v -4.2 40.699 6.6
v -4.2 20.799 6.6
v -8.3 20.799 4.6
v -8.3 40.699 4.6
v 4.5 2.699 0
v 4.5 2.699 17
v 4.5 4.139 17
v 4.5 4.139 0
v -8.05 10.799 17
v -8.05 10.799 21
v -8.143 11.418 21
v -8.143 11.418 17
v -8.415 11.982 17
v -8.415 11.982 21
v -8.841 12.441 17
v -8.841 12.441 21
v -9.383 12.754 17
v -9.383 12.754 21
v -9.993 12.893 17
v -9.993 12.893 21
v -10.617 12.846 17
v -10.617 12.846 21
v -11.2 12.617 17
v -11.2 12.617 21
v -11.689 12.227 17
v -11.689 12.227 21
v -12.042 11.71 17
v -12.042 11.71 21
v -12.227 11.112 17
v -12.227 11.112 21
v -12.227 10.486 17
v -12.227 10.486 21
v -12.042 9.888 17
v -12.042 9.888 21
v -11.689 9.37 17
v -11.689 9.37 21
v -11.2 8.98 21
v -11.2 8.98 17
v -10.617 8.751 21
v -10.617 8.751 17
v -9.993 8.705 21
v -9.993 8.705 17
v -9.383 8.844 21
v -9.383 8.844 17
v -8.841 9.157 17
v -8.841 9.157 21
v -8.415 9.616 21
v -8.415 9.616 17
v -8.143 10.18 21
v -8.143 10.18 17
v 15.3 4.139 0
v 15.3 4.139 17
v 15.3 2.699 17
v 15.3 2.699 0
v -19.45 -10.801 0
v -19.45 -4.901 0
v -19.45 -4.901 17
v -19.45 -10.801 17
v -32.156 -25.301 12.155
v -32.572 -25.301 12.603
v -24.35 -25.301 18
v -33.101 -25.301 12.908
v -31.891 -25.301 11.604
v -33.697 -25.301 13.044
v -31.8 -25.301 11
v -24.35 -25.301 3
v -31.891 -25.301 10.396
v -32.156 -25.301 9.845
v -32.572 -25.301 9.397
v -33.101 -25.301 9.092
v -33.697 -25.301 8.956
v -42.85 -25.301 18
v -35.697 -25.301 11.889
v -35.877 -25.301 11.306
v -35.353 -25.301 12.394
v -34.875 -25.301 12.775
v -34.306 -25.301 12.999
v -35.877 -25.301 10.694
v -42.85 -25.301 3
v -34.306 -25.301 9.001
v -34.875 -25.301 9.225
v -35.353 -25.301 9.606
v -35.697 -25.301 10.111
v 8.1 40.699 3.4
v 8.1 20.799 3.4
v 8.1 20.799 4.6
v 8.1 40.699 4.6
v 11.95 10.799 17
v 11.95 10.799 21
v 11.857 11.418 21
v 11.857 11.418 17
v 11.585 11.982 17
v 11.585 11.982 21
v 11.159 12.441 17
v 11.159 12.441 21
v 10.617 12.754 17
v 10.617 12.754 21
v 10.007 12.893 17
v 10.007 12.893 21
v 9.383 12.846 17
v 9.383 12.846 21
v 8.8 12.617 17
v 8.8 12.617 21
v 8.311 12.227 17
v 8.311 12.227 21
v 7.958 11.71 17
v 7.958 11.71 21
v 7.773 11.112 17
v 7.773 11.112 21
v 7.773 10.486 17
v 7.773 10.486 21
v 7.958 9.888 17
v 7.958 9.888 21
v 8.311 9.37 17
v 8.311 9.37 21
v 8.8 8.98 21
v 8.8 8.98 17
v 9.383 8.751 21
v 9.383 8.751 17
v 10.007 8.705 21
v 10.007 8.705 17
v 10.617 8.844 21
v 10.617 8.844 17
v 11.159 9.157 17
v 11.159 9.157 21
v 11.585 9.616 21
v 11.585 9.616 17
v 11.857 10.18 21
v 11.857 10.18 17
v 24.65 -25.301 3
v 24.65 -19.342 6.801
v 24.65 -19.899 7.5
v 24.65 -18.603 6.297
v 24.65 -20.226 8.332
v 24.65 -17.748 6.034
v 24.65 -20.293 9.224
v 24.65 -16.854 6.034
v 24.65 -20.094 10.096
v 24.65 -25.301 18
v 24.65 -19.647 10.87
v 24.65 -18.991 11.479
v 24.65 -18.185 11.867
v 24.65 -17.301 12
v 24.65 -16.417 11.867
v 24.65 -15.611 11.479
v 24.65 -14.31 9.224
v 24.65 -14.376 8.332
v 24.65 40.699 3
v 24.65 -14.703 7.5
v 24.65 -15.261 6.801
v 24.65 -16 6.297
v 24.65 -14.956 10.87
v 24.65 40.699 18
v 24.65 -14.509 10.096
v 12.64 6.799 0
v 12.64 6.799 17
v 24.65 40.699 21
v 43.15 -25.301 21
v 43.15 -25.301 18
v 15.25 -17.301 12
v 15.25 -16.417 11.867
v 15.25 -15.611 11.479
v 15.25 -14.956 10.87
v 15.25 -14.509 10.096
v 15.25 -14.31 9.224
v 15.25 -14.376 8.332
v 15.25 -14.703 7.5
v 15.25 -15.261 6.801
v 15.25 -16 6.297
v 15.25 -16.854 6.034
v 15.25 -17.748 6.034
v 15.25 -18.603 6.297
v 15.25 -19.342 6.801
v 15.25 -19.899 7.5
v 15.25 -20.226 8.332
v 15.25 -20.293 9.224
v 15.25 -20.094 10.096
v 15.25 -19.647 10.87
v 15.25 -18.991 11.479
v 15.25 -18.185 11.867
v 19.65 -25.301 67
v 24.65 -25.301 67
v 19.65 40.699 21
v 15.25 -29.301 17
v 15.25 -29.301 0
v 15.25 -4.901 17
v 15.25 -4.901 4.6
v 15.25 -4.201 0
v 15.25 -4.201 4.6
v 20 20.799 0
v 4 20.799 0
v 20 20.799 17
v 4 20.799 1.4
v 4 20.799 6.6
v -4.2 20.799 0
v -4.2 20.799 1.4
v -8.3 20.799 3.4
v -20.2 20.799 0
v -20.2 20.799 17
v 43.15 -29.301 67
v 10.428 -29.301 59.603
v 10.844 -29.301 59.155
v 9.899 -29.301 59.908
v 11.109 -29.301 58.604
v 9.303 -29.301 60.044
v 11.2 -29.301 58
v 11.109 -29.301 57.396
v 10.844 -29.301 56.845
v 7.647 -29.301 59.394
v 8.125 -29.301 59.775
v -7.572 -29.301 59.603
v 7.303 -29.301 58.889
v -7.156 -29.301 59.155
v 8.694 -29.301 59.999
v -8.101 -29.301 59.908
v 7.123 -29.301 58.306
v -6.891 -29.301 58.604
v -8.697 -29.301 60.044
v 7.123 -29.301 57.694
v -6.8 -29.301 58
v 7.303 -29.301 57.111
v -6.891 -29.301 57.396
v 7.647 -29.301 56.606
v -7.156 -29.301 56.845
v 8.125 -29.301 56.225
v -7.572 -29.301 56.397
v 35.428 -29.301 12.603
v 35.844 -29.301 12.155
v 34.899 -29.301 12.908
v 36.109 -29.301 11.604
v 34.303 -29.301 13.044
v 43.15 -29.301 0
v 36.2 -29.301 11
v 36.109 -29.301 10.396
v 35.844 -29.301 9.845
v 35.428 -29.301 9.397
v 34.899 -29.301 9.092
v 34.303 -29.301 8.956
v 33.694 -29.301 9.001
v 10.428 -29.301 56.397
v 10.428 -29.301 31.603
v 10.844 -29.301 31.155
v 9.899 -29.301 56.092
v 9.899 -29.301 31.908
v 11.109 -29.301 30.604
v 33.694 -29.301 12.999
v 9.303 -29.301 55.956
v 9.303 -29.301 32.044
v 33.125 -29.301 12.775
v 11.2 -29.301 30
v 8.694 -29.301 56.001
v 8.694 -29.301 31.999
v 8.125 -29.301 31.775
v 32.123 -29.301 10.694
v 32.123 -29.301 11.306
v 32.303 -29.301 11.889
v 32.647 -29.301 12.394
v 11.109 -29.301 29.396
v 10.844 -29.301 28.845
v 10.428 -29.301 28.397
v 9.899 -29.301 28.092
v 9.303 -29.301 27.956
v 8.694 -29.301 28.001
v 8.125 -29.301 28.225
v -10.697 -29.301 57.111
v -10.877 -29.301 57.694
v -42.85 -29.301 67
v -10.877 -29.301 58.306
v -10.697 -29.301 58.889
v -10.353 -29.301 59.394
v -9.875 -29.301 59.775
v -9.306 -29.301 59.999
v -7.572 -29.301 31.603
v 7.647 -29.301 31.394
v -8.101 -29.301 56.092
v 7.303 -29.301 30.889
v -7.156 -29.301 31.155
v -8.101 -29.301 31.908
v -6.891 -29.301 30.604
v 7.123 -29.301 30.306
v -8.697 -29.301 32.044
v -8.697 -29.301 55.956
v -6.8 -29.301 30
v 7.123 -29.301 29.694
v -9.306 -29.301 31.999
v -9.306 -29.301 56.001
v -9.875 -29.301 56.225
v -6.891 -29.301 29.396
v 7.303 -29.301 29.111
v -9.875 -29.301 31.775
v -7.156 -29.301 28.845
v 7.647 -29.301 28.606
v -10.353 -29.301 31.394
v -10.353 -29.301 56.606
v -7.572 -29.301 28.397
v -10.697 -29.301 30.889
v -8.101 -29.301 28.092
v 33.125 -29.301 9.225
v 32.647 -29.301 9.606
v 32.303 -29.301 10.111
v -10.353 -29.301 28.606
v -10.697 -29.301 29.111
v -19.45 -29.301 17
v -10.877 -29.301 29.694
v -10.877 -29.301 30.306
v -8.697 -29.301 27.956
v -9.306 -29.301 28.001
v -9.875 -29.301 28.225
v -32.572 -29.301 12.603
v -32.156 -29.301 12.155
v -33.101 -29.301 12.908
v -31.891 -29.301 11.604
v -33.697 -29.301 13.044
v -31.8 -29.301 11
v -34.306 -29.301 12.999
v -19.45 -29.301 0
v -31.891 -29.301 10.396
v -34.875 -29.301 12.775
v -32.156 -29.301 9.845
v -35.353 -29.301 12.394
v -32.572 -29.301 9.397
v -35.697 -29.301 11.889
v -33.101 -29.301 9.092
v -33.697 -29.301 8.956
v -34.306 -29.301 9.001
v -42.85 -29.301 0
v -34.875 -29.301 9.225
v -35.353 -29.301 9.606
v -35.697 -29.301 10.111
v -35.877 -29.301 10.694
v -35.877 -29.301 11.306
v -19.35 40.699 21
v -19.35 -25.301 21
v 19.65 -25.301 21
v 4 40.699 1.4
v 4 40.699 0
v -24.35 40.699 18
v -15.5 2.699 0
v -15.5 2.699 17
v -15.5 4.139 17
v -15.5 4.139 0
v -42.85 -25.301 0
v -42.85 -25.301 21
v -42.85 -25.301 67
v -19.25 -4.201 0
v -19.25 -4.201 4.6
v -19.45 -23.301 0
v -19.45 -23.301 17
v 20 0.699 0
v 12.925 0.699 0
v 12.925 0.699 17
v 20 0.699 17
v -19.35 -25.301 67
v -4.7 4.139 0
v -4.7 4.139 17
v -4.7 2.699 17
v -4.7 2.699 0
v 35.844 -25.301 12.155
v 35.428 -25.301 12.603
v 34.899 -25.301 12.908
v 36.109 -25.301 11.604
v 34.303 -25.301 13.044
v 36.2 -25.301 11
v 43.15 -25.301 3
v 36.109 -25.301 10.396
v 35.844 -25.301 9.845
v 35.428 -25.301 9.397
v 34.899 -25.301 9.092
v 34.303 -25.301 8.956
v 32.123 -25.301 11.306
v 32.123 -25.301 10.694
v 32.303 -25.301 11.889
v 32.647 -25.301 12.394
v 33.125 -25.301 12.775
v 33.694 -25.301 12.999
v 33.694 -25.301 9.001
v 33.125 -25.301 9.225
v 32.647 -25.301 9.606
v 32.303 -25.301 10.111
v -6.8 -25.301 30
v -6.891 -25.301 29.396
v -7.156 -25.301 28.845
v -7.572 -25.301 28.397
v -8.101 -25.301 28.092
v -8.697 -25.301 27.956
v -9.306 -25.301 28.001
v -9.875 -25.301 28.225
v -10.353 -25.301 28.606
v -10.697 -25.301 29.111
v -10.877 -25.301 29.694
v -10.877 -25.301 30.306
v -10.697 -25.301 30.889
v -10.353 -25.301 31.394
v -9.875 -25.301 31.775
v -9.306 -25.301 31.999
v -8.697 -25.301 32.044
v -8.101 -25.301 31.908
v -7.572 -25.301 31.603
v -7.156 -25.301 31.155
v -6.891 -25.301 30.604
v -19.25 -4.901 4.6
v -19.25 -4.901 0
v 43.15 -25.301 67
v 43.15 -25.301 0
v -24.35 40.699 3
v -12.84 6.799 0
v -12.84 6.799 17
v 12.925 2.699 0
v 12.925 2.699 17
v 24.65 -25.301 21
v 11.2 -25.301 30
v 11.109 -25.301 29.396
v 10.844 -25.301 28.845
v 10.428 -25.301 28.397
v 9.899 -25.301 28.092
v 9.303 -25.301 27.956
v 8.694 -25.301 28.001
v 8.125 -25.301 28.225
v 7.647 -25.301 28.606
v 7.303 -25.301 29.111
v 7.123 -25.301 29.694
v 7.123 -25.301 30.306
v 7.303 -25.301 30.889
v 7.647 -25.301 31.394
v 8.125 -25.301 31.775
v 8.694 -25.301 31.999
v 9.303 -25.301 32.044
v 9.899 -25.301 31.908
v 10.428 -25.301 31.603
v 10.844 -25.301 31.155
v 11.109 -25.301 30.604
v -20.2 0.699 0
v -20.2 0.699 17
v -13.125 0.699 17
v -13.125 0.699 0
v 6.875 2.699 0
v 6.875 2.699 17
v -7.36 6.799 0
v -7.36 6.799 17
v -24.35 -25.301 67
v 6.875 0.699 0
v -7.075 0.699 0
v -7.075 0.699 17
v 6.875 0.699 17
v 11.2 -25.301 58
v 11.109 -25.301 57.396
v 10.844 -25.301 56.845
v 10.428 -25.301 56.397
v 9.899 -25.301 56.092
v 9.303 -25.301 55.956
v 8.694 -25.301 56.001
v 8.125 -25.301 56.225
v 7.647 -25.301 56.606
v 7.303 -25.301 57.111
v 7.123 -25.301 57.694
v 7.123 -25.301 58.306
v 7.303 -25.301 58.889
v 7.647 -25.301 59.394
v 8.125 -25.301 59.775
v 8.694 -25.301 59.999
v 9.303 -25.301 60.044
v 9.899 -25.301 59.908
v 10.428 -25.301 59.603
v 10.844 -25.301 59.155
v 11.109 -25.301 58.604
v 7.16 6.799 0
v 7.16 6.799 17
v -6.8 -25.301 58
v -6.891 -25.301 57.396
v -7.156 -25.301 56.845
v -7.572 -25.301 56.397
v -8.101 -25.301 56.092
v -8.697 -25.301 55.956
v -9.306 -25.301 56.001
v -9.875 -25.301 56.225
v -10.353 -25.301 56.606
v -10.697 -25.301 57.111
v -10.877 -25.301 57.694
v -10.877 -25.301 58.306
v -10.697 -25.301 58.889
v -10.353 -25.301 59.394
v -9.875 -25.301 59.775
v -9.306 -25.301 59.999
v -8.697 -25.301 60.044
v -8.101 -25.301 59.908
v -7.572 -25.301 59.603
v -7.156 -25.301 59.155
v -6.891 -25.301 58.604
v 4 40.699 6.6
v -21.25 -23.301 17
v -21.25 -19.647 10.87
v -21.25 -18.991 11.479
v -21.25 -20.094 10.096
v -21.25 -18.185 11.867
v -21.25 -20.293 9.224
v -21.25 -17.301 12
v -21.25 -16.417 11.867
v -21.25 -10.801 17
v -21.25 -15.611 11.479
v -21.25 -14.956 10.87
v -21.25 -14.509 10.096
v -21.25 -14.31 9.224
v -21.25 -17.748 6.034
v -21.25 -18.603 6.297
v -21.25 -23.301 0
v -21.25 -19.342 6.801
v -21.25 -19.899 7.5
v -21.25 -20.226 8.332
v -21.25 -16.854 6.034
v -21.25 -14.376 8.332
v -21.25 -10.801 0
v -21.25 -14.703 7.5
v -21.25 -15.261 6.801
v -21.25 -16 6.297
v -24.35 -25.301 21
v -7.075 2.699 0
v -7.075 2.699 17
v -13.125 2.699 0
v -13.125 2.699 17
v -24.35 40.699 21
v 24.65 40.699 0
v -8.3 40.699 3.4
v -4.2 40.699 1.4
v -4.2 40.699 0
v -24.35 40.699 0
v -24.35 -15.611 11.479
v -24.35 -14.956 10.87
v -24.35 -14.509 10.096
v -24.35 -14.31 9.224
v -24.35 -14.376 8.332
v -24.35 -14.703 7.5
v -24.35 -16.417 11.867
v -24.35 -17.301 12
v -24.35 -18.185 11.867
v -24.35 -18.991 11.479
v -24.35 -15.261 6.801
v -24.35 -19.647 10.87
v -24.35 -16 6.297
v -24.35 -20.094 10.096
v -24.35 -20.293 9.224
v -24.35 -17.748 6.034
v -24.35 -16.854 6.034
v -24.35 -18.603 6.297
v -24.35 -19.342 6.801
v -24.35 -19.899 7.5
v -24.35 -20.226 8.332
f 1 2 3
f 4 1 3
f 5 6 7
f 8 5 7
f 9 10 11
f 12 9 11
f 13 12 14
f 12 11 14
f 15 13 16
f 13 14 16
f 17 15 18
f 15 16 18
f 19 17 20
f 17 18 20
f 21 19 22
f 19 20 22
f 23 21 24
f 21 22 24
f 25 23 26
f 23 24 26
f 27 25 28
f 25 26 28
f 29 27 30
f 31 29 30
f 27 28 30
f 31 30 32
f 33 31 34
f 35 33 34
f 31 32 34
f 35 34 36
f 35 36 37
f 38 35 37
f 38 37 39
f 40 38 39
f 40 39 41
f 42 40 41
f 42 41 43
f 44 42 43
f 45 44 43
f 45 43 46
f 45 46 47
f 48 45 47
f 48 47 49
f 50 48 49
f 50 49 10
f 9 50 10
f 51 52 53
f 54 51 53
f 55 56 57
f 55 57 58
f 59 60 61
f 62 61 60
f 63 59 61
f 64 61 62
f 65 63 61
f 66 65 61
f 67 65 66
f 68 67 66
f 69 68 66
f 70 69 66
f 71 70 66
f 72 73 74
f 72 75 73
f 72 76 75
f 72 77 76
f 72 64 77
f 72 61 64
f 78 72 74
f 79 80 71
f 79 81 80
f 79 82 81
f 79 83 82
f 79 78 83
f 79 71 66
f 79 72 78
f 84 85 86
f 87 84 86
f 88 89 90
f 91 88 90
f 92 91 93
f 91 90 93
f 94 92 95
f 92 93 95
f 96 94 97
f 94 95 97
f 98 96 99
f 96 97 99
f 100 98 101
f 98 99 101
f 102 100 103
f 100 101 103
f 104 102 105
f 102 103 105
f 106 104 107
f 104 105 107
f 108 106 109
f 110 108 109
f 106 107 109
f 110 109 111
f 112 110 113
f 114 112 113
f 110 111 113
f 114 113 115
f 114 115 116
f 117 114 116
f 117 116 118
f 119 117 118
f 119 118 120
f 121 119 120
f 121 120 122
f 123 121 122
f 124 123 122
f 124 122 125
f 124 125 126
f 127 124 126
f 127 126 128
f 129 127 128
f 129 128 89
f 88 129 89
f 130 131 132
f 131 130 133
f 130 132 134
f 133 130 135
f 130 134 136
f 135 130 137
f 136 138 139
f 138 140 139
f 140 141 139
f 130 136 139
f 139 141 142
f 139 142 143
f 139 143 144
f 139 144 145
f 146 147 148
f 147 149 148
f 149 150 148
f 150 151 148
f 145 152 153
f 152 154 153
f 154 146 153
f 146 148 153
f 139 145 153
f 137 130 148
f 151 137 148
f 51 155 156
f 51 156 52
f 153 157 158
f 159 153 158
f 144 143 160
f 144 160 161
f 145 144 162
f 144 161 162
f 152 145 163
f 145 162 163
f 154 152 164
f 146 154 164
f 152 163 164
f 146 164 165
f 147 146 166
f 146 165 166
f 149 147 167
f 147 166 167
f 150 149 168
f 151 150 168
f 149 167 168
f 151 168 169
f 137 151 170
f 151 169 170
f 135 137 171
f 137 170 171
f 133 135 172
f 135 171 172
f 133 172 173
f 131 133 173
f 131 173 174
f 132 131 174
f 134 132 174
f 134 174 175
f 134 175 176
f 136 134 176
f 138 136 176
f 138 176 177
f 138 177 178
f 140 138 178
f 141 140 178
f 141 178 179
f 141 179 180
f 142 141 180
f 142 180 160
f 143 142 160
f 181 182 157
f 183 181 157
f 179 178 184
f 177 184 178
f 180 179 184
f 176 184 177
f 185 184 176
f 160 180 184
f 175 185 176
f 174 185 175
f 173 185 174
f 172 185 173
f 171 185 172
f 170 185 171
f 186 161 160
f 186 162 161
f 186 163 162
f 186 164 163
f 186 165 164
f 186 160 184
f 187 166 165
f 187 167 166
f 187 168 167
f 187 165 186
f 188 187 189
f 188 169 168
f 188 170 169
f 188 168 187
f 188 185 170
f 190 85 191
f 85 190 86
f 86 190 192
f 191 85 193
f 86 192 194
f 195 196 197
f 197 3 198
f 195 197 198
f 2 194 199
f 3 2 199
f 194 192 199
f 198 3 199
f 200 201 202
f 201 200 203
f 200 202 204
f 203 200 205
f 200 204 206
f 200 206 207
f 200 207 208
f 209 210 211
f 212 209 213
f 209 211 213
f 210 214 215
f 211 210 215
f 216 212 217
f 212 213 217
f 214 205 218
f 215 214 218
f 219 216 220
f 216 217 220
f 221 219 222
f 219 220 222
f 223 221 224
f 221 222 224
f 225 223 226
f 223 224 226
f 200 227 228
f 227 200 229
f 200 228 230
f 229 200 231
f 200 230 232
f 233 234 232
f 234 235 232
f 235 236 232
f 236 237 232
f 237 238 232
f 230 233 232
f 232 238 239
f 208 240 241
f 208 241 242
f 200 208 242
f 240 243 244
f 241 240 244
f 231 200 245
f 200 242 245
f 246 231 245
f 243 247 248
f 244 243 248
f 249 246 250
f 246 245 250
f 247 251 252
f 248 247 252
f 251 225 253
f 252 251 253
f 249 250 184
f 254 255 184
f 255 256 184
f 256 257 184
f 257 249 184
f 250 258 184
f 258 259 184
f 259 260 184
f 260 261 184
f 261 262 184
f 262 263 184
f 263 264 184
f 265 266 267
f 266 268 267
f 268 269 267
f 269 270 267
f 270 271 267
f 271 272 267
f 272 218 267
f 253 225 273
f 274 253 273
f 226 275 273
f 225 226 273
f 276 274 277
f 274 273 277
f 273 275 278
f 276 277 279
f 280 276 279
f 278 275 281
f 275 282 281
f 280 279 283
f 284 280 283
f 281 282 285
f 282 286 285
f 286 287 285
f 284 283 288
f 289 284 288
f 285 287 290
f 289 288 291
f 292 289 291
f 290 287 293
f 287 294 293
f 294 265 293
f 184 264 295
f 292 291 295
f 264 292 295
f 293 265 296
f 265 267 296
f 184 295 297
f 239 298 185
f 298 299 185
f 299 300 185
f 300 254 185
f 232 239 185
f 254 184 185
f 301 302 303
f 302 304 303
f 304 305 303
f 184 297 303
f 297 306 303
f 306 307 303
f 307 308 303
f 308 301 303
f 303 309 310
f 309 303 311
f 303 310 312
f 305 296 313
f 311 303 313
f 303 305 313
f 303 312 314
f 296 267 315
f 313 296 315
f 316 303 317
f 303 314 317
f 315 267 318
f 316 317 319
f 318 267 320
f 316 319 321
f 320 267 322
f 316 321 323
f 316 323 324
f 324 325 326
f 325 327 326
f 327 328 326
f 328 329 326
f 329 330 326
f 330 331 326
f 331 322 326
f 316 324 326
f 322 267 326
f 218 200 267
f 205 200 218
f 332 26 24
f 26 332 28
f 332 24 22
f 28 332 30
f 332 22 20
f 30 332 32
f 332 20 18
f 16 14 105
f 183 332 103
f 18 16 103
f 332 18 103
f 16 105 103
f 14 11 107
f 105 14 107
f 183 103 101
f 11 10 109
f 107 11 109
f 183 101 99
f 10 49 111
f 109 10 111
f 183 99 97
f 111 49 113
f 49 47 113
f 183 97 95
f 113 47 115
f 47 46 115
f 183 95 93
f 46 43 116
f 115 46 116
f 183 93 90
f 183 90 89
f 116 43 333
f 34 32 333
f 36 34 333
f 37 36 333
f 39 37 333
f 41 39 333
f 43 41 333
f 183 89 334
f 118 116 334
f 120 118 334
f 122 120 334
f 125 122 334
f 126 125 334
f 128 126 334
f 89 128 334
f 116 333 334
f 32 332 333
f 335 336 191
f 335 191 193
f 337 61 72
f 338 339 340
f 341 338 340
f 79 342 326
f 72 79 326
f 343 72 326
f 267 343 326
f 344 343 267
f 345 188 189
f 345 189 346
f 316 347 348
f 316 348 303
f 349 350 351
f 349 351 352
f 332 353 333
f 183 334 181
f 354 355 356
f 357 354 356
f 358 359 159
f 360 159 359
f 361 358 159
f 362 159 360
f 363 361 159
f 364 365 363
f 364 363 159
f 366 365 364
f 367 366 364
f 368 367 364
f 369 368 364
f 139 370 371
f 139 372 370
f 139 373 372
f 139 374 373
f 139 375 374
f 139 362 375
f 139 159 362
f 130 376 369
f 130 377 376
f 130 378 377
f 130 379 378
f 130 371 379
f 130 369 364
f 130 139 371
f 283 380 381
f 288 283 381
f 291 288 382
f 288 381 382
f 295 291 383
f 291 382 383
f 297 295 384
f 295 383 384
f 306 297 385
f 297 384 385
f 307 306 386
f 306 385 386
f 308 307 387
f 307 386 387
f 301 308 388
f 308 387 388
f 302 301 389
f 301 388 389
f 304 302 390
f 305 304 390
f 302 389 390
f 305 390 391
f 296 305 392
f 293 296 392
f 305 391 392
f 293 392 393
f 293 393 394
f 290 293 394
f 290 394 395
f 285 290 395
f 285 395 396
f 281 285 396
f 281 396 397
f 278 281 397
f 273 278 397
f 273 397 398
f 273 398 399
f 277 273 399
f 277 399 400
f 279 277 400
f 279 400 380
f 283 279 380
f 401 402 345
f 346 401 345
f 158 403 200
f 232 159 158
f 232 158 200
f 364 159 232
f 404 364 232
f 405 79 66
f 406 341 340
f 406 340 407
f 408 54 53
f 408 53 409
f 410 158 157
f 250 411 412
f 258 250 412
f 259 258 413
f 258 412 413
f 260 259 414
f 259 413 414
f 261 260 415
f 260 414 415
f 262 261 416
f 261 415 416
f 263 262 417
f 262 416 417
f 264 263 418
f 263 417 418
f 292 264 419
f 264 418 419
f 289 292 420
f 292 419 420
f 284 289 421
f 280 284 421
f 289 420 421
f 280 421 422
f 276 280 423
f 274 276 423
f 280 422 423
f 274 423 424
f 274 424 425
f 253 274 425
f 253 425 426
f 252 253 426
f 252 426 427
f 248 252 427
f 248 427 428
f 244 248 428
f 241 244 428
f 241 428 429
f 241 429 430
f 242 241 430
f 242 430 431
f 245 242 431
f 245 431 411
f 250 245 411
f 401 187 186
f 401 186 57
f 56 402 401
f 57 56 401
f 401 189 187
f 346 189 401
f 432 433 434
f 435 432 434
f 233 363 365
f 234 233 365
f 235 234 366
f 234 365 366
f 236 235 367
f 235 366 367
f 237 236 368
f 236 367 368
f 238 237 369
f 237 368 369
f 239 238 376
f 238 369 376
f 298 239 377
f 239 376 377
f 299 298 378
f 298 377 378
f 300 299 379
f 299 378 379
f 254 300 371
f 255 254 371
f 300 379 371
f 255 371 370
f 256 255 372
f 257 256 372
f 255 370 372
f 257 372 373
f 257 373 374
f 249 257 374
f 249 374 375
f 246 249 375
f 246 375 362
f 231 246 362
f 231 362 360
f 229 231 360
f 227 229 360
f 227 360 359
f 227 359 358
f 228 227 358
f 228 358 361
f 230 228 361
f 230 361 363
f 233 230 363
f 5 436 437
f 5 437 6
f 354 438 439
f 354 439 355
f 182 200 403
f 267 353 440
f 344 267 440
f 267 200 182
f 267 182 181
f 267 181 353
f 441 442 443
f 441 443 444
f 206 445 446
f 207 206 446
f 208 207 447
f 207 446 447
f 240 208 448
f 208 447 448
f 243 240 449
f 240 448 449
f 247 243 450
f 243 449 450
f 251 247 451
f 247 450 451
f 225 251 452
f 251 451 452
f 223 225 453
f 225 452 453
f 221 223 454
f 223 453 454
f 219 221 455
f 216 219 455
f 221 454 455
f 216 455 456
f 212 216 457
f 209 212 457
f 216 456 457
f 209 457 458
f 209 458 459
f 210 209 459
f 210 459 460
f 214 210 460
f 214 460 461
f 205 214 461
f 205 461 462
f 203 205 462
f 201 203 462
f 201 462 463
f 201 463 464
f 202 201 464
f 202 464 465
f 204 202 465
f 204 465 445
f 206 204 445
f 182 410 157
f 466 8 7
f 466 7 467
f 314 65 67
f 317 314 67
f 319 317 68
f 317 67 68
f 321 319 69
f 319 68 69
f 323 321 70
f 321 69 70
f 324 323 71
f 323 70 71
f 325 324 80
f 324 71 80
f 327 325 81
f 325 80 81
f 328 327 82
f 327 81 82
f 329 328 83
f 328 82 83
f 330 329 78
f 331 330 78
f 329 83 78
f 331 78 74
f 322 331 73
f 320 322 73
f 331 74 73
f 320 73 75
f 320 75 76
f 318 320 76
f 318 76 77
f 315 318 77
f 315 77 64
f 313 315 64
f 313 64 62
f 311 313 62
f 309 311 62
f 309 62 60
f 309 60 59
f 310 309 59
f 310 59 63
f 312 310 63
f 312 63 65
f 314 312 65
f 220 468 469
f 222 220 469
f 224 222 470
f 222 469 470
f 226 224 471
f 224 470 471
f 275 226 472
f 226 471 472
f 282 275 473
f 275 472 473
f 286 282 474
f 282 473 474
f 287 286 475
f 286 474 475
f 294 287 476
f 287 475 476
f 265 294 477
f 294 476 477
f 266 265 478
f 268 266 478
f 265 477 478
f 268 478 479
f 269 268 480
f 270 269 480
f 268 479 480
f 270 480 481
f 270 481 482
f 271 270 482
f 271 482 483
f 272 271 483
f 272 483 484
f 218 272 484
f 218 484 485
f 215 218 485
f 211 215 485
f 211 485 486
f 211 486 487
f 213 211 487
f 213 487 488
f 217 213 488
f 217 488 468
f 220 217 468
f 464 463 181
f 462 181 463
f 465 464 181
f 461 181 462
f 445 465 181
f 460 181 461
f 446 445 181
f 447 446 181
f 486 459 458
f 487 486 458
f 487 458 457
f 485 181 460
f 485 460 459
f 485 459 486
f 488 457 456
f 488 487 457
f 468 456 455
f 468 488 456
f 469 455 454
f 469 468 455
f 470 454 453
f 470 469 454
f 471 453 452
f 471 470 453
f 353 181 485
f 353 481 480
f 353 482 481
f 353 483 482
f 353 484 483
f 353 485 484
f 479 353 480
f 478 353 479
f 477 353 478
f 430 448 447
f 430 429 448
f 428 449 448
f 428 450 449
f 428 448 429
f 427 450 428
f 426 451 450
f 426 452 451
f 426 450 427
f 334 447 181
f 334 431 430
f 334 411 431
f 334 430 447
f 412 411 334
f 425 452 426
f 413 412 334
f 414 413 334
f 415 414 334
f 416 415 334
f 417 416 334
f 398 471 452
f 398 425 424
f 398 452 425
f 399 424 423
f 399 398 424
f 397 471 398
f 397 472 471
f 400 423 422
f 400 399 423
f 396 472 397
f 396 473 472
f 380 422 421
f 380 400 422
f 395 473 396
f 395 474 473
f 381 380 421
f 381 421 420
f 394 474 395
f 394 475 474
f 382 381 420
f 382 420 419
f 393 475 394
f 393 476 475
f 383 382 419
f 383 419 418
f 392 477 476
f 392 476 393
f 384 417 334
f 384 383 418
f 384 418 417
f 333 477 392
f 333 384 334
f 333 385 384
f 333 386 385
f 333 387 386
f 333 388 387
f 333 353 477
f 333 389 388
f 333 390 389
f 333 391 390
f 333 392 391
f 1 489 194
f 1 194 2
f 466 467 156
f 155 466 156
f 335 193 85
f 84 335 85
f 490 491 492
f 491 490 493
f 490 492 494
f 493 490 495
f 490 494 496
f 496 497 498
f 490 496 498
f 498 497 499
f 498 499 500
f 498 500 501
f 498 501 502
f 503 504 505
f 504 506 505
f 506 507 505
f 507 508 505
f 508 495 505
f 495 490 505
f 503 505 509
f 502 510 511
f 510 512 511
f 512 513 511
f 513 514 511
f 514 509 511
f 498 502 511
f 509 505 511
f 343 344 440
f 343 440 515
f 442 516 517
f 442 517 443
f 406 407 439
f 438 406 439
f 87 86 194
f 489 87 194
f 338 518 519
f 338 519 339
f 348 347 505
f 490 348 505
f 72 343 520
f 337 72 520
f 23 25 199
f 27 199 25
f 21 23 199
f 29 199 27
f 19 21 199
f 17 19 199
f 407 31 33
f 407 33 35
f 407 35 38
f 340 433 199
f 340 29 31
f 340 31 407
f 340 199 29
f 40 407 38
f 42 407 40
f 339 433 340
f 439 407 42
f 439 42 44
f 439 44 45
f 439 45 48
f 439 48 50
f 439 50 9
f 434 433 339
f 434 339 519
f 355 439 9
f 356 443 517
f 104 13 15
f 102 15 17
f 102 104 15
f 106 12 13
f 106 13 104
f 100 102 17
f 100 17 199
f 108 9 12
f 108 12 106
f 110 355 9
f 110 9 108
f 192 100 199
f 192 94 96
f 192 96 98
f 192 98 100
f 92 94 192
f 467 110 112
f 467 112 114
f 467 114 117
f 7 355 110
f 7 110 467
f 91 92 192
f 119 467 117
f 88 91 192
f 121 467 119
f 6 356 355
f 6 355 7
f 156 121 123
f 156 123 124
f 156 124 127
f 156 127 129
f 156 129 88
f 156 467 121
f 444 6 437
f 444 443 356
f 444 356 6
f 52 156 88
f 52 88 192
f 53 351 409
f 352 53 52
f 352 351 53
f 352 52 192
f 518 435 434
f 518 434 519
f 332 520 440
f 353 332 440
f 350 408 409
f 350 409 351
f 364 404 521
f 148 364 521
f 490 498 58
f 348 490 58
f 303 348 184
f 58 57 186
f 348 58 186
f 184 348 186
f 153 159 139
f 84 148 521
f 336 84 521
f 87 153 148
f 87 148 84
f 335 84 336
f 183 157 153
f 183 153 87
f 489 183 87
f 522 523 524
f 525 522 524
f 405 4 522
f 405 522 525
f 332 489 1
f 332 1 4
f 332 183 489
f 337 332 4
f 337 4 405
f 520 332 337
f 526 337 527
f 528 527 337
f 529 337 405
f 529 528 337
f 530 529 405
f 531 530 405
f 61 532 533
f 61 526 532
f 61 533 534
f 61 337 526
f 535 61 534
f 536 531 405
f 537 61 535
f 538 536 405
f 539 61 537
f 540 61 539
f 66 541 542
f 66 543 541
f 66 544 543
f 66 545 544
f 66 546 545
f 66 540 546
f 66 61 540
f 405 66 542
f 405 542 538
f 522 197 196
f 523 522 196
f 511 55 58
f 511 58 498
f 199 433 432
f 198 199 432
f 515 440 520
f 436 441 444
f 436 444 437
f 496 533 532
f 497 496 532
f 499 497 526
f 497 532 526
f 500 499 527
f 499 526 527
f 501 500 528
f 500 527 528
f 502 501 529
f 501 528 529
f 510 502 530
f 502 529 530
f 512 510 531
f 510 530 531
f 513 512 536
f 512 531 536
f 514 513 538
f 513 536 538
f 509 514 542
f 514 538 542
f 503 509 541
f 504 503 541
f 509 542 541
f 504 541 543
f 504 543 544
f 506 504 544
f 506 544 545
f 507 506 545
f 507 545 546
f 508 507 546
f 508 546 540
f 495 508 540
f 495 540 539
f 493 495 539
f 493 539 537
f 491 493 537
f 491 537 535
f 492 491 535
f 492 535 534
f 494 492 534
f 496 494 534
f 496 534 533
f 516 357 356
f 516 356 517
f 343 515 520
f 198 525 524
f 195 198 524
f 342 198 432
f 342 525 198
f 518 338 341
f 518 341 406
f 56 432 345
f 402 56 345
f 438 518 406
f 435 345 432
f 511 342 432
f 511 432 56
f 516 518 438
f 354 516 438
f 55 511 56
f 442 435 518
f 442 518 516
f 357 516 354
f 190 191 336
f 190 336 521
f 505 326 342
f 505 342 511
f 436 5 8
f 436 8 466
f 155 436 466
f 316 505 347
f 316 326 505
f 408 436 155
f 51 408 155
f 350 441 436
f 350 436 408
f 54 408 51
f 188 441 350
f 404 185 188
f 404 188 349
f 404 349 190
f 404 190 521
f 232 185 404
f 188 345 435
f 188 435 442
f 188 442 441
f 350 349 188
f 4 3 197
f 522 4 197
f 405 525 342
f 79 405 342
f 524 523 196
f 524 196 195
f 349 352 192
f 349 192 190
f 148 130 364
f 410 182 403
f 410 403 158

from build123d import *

# Parameters (mm, degrees)
EXTRUDE_1_DEPTH     = 17
SKETCH_5_R          = 3
CUT_EXTRUDE_3_DEPTH = 49
SKETCH_6_W          = 49
SKETCH_6_H          = 4
EXTRUDE_3_DEPTH     = 50
SKETCH_7_W          = 67
SKETCH_7_H          = 4
EXTRUDE_4_DEPTH     = 18.5
SKETCH_8_W          = 67
SKETCH_8_H          = 4
EXTRUDE_5_DEPTH     = 18.5
SKETCH_14_W         = 49
SKETCH_14_H         = 4
EXTRUDE_13_DEPTH    = 66
SKETCH_23_W         = 49
SKETCH_23_H         = 19.9
EXTRUDE_18_DEPTH    = 17
CUT_EXTRUDE_4_REACH = 6
SKETCH_13_R         = 2.05
EXTRUDE_14_DEPTH    = 5
EXTRUDE_15_DEPTH    = 5
CUT_EXTRUDE_5_REACH = 23
SKETCH_18_R         = 2.1
SKETCH_21_W         = 34.5
SKETCH_21_H         = 0.7
CUT_EXTRUDE_6_DEPTH = 4.6
EXTRUDE_19_DEPTH    = 3
EXTRUDE_20_DEPTH    = 3
EXTRUDE_21_REACH    = 42
SKETCH_29_W         = 4.15
SKETCH_29_H         = 17
SKETCH_29_W_2       = 4.65
SKETCH_3_W          = 2
SKETCH_3_H          = 12.5
CUT_EXTRUDE_7_DEPTH = 17
CUT_EXTRUDE_8_DEPTH = 20


with BuildPart() as part:
    # Эскиз1 → Бобышка-Вытянуть1 (new body)
    with BuildSketch(Plane.XY):
        Polygon((-13.125, 2.698768931), (-15.5, 2.698768931), (-15.5, 4.138768931), (-12.84, 6.798768931), (-7.36, 6.798768931), (-4.7, 4.138768931), (-4.7, 2.698768931), (-7.075, 2.698768931), (-7.075, 0.698768931), (6.875, 0.698768931), (6.875, 2.698768931), (4.5, 2.698768931), (4.5, 4.138768931), (7.16, 6.798768931), (12.64, 6.798768931), (15.3, 4.138768931), (15.3, 2.698768931), (12.925, 2.698768931), (12.925, 0.698768931), (24.65, 0.698768931), (24.65, -29.301231069), (15.25, -29.301231069), (15.25, -4.901231069), (-19.45, -4.901231069), (-19.45, -29.301231069), (-24.35, -29.301231069), (-24.35, 0.698768931), (-13.125, 0.698768931), align=None)
    extrude(amount=EXTRUDE_1_DEPTH)

    # Эскиз5 → Вырез-Вытянуть3 (cut)
    with BuildSketch(Plane.ZY.offset(24.35)):
        with Locations((9, -17.301231069)):
            Circle(SKETCH_5_R)
    extrude(amount=-CUT_EXTRUDE_3_DEPTH, mode=Mode.SUBTRACT)

    # Эскиз6 → Бобышка-Вытянуть3 (add)
    with BuildSketch(Plane.XY.offset(17)):
        with Locations((0.15, -27.301231069)):
            Rectangle(SKETCH_6_W, SKETCH_6_H)
    extrude(amount=EXTRUDE_3_DEPTH)

    # Эскиз7 → Бобышка-Вытянуть4 (add)
    with BuildSketch(Plane.ZY.offset(24.35)):
        with Locations((33.5, -27.301231069)):
            Rectangle(SKETCH_7_W, SKETCH_7_H)
    extrude(amount=EXTRUDE_4_DEPTH)

    # Эскиз8 → Бобышка-Вытянуть5 (add)
    with BuildSketch(Plane(origin=(24.65, 0, 0), x_dir=(0, 0, -1), z_dir=(1, 0, 0))):
        with Locations((-33.5, -27.301231069)):
            Rectangle(SKETCH_8_W, SKETCH_8_H)
    extrude(amount=EXTRUDE_5_DEPTH)

    # Эскиз14 → Бобышка-Вытянуть13 (add)
    with BuildSketch(Plane(origin=(0, -25.301231069, 0), x_dir=(1, 0, 0), z_dir=(0, 1, 0))):
        with Locations((0.15, -19)):
            Rectangle(SKETCH_14_W, SKETCH_14_H)
    extrude(amount=EXTRUDE_13_DEPTH)

    # Эскиз23 → Бобышка-Вытянуть18 (add)
    with BuildSketch(Plane(origin=(0, 0, 17), x_dir=(-1, 0, 0), z_dir=(0, 0, -1))):
        with Locations((-0.15, 30.748768931)):
            Rectangle(SKETCH_23_W, SKETCH_23_H)
    extrude(amount=EXTRUDE_18_DEPTH)

    # Эскиз13 → Вырез-Вытянуть4 (cut, up to next)
    with BuildSketch(Plane(origin=(0, -25.301231069, 0), x_dir=(1, 0, 0), z_dir=(0, 1, 0)), mode=Mode.PRIVATE) as cut_extrude_4_sk1:
        with Locations((-8.85, -58)):
            Circle(SKETCH_13_R)
    cut_extrude_4_tool1 = extrude(cut_extrude_4_sk1.sketch, amount=-CUT_EXTRUDE_4_REACH, mode=Mode.PRIVATE) & part.part
    add(cut_extrude_4_tool1.solids().sort_by_distance((-8.85, -25.301231, 58))[0], mode=Mode.SUBTRACT)
    # Эскиз13 → Вырез-Вытянуть4 (cut, up to next)
    with BuildSketch(Plane(origin=(0, -25.301231069, 0), x_dir=(1, 0, 0), z_dir=(0, 1, 0)), mode=Mode.PRIVATE) as cut_extrude_4_sk2:
        with Locations((9.15, -58)):
            Circle(SKETCH_13_R)
    cut_extrude_4_tool2 = extrude(cut_extrude_4_sk2.sketch, amount=-CUT_EXTRUDE_4_REACH, mode=Mode.PRIVATE) & part.part
    add(cut_extrude_4_tool2.solids().sort_by_distance((9.15, -25.301231, 58))[0], mode=Mode.SUBTRACT)
    # Эскиз13 → Вырез-Вытянуть4 (cut, up to next)
    with BuildSketch(Plane(origin=(0, -25.301231069, 0), x_dir=(1, 0, 0), z_dir=(0, 1, 0)), mode=Mode.PRIVATE) as cut_extrude_4_sk3:
        with Locations((-33.85, -11)):
            Circle(SKETCH_13_R)
    cut_extrude_4_tool3 = extrude(cut_extrude_4_sk3.sketch, amount=-CUT_EXTRUDE_4_REACH, mode=Mode.PRIVATE) & part.part
    add(cut_extrude_4_tool3.solids().sort_by_distance((-33.85, -25.301231, 11))[0], mode=Mode.SUBTRACT)
    # Эскиз13 → Вырез-Вытянуть4 (cut, up to next)
    with BuildSketch(Plane(origin=(0, -25.301231069, 0), x_dir=(1, 0, 0), z_dir=(0, 1, 0)), mode=Mode.PRIVATE) as cut_extrude_4_sk4:
        with Locations((34.15, -11)):
            Circle(SKETCH_13_R)
    cut_extrude_4_tool4 = extrude(cut_extrude_4_sk4.sketch, amount=-CUT_EXTRUDE_4_REACH, mode=Mode.PRIVATE) & part.part
    add(cut_extrude_4_tool4.solids().sort_by_distance((34.15, -25.301231, 11))[0], mode=Mode.SUBTRACT)
    # Эскиз13 → Вырез-Вытянуть4 (cut, up to next)
    with BuildSketch(Plane(origin=(0, -25.301231069, 0), x_dir=(1, 0, 0), z_dir=(0, 1, 0)), mode=Mode.PRIVATE) as cut_extrude_4_sk5:
        with Locations((-8.85, -30)):
            Circle(SKETCH_13_R)
    cut_extrude_4_tool5 = extrude(cut_extrude_4_sk5.sketch, amount=-CUT_EXTRUDE_4_REACH, mode=Mode.PRIVATE) & part.part
    add(cut_extrude_4_tool5.solids().sort_by_distance((-8.85, -25.301231, 30))[0], mode=Mode.SUBTRACT)
    # Эскиз13 → Вырез-Вытянуть4 (cut, up to next)
    with BuildSketch(Plane(origin=(0, -25.301231069, 0), x_dir=(1, 0, 0), z_dir=(0, 1, 0)), mode=Mode.PRIVATE) as cut_extrude_4_sk6:
        with Locations((9.15, -30)):
            Circle(SKETCH_13_R)
    cut_extrude_4_tool6 = extrude(cut_extrude_4_sk6.sketch, amount=-CUT_EXTRUDE_4_REACH, mode=Mode.PRIVATE) & part.part
    add(cut_extrude_4_tool6.solids().sort_by_distance((9.15, -25.301231, 30))[0], mode=Mode.SUBTRACT)

    # Эскиз16 → Бобышка-Вытянуть14 (add)
    with BuildSketch(Plane.ZY.offset(24.35)):
        Polygon((21, -25.301231069), (21, 40.698768931), (67, -25.301231069), align=None)
    extrude(amount=-EXTRUDE_14_DEPTH)

    # Эскиз17 → Бобышка-Вытянуть15 (add)
    with BuildSketch(Plane(origin=(24.65, 0, 0), x_dir=(0, 0, -1), z_dir=(1, 0, 0))):
        Polygon((-67, -25.301231069), (-21, 40.698768931), (-21, -25.301231069), align=None)
    extrude(amount=-EXTRUDE_15_DEPTH)

    # Эскиз18 → Вырез-Вытянуть5 (cut, up to next)
    with BuildSketch(Plane.XY.offset(21), mode=Mode.PRIVATE) as cut_extrude_5_sk1:
        with Locations((9.85, 10.798768931)):
            Circle(SKETCH_18_R)
    cut_extrude_5_tool1 = extrude(cut_extrude_5_sk1.sketch, amount=-CUT_EXTRUDE_5_REACH, mode=Mode.PRIVATE) & part.part
    add(cut_extrude_5_tool1.solids().sort_by_distance((9.85, 10.798769, 21))[0], mode=Mode.SUBTRACT)
    # Эскиз18 → Вырез-Вытянуть5 (cut, up to next)
    with BuildSketch(Plane.XY.offset(21), mode=Mode.PRIVATE) as cut_extrude_5_sk2:
        with Locations((-10.15, 10.798768931)):
            Circle(SKETCH_18_R)
    cut_extrude_5_tool2 = extrude(cut_extrude_5_sk2.sketch, amount=-CUT_EXTRUDE_5_REACH, mode=Mode.PRIVATE) & part.part
    add(cut_extrude_5_tool2.solids().sort_by_distance((-10.15, 10.798769, 21))[0], mode=Mode.SUBTRACT)

    # Эскиз21 → Вырез-Вытянуть6 (cut)
    with BuildSketch(Plane(origin=(0, 0, 0), x_dir=(-1, 0, 0), z_dir=(0, 0, -1))):
        with Locations((2, -4.551231069)):
            Rectangle(SKETCH_21_W, SKETCH_21_H)
    extrude(amount=-CUT_EXTRUDE_6_DEPTH, mode=Mode.SUBTRACT)

    # Эскиз25 → Бобышка-Вытянуть19 (add)
    with BuildSketch(Plane(origin=(0, 0, 0), x_dir=(-1, 0, 0), z_dir=(0, 0, -1))):
        Polygon((-24.65, 40.698768931), (-24.65, -25.301231069), (-43.15, -25.301231069), align=None)
        Polygon((42.85, -25.301231069), (24.35, -25.301231069), (24.35, 40.698768931), align=None)
    extrude(amount=-EXTRUDE_19_DEPTH)

    # Эскиз28 → Бобышка-Вытянуть20 (add)
    with BuildSketch(Plane.XY.offset(21)):
        Polygon((43.15, -25.301231069), (24.65, -25.301231069), (24.65, 40.698768931), align=None)
        Polygon((-24.35, -25.301231069), (-42.85, -25.301231069), (-24.35, 40.698768931), align=None)
    extrude(amount=-EXTRUDE_20_DEPTH)

    # Эскиз29 → Бобышка-Вытянуть21 (add, up to next)
    with BuildSketch(Plane(origin=(0, 0.698768931, 0), x_dir=(1, 0, 0), z_dir=(0, 1, 0)), mode=Mode.PRIVATE) as extrude_21_sk1:
        with Locations((-22.275, -8.5)):
            Rectangle(SKETCH_29_W, SKETCH_29_H)
    extrude_21_tool1 = extrude(extrude_21_sk1.sketch, amount=EXTRUDE_21_REACH, mode=Mode.PRIVATE) - part.part
    add(extrude_21_tool1.solids().sort_by_distance((-22.275, 0.698769, 8.5))[0])
    # Эскиз29 → Бобышка-Вытянуть21 (add, up to next)
    with BuildSketch(Plane(origin=(0, 0.698768931, 0), x_dir=(1, 0, 0), z_dir=(0, 1, 0)), mode=Mode.PRIVATE) as extrude_21_sk2:
        with Locations((22.325, -8.5)):
            Rectangle(SKETCH_29_W_2, SKETCH_29_H)
    extrude_21_tool2 = extrude(extrude_21_sk2.sketch, amount=EXTRUDE_21_REACH, mode=Mode.PRIVATE) - part.part
    add(extrude_21_tool2.solids().sort_by_distance((22.325, 0.698769, 8.5))[0])

    # Эскиз3 → Вырез-Вытянуть7 (cut)
    with BuildSketch(Plane(origin=(0, 0, 0), x_dir=(-1, 0, 0), z_dir=(0, 0, -1))):
        with Locations((20.25, -17.051231069)):
            Rectangle(SKETCH_3_W, SKETCH_3_H)
    extrude(amount=-CUT_EXTRUDE_7_DEPTH, mode=Mode.SUBTRACT)

    # Эскиз30 → Вырез-Вытянуть8 (cut)
    with BuildSketch(Plane(origin=(0, 40.698768931, 0), x_dir=(1, 0, 0), z_dir=(0, 1, 0))):
        Polygon((-4.2, 0), (4, 0), (4, -1.4), (8.1, -3.4), (8.1, -4.6), (4, -6.6), (-4.2, -6.6), (-8.3, -4.6), (-8.3, -3.4), (-4.2, -1.4), align=None)
    extrude(amount=-CUT_EXTRUDE_8_DEPTH, mode=Mode.SUBTRACT)


solid = part.part
